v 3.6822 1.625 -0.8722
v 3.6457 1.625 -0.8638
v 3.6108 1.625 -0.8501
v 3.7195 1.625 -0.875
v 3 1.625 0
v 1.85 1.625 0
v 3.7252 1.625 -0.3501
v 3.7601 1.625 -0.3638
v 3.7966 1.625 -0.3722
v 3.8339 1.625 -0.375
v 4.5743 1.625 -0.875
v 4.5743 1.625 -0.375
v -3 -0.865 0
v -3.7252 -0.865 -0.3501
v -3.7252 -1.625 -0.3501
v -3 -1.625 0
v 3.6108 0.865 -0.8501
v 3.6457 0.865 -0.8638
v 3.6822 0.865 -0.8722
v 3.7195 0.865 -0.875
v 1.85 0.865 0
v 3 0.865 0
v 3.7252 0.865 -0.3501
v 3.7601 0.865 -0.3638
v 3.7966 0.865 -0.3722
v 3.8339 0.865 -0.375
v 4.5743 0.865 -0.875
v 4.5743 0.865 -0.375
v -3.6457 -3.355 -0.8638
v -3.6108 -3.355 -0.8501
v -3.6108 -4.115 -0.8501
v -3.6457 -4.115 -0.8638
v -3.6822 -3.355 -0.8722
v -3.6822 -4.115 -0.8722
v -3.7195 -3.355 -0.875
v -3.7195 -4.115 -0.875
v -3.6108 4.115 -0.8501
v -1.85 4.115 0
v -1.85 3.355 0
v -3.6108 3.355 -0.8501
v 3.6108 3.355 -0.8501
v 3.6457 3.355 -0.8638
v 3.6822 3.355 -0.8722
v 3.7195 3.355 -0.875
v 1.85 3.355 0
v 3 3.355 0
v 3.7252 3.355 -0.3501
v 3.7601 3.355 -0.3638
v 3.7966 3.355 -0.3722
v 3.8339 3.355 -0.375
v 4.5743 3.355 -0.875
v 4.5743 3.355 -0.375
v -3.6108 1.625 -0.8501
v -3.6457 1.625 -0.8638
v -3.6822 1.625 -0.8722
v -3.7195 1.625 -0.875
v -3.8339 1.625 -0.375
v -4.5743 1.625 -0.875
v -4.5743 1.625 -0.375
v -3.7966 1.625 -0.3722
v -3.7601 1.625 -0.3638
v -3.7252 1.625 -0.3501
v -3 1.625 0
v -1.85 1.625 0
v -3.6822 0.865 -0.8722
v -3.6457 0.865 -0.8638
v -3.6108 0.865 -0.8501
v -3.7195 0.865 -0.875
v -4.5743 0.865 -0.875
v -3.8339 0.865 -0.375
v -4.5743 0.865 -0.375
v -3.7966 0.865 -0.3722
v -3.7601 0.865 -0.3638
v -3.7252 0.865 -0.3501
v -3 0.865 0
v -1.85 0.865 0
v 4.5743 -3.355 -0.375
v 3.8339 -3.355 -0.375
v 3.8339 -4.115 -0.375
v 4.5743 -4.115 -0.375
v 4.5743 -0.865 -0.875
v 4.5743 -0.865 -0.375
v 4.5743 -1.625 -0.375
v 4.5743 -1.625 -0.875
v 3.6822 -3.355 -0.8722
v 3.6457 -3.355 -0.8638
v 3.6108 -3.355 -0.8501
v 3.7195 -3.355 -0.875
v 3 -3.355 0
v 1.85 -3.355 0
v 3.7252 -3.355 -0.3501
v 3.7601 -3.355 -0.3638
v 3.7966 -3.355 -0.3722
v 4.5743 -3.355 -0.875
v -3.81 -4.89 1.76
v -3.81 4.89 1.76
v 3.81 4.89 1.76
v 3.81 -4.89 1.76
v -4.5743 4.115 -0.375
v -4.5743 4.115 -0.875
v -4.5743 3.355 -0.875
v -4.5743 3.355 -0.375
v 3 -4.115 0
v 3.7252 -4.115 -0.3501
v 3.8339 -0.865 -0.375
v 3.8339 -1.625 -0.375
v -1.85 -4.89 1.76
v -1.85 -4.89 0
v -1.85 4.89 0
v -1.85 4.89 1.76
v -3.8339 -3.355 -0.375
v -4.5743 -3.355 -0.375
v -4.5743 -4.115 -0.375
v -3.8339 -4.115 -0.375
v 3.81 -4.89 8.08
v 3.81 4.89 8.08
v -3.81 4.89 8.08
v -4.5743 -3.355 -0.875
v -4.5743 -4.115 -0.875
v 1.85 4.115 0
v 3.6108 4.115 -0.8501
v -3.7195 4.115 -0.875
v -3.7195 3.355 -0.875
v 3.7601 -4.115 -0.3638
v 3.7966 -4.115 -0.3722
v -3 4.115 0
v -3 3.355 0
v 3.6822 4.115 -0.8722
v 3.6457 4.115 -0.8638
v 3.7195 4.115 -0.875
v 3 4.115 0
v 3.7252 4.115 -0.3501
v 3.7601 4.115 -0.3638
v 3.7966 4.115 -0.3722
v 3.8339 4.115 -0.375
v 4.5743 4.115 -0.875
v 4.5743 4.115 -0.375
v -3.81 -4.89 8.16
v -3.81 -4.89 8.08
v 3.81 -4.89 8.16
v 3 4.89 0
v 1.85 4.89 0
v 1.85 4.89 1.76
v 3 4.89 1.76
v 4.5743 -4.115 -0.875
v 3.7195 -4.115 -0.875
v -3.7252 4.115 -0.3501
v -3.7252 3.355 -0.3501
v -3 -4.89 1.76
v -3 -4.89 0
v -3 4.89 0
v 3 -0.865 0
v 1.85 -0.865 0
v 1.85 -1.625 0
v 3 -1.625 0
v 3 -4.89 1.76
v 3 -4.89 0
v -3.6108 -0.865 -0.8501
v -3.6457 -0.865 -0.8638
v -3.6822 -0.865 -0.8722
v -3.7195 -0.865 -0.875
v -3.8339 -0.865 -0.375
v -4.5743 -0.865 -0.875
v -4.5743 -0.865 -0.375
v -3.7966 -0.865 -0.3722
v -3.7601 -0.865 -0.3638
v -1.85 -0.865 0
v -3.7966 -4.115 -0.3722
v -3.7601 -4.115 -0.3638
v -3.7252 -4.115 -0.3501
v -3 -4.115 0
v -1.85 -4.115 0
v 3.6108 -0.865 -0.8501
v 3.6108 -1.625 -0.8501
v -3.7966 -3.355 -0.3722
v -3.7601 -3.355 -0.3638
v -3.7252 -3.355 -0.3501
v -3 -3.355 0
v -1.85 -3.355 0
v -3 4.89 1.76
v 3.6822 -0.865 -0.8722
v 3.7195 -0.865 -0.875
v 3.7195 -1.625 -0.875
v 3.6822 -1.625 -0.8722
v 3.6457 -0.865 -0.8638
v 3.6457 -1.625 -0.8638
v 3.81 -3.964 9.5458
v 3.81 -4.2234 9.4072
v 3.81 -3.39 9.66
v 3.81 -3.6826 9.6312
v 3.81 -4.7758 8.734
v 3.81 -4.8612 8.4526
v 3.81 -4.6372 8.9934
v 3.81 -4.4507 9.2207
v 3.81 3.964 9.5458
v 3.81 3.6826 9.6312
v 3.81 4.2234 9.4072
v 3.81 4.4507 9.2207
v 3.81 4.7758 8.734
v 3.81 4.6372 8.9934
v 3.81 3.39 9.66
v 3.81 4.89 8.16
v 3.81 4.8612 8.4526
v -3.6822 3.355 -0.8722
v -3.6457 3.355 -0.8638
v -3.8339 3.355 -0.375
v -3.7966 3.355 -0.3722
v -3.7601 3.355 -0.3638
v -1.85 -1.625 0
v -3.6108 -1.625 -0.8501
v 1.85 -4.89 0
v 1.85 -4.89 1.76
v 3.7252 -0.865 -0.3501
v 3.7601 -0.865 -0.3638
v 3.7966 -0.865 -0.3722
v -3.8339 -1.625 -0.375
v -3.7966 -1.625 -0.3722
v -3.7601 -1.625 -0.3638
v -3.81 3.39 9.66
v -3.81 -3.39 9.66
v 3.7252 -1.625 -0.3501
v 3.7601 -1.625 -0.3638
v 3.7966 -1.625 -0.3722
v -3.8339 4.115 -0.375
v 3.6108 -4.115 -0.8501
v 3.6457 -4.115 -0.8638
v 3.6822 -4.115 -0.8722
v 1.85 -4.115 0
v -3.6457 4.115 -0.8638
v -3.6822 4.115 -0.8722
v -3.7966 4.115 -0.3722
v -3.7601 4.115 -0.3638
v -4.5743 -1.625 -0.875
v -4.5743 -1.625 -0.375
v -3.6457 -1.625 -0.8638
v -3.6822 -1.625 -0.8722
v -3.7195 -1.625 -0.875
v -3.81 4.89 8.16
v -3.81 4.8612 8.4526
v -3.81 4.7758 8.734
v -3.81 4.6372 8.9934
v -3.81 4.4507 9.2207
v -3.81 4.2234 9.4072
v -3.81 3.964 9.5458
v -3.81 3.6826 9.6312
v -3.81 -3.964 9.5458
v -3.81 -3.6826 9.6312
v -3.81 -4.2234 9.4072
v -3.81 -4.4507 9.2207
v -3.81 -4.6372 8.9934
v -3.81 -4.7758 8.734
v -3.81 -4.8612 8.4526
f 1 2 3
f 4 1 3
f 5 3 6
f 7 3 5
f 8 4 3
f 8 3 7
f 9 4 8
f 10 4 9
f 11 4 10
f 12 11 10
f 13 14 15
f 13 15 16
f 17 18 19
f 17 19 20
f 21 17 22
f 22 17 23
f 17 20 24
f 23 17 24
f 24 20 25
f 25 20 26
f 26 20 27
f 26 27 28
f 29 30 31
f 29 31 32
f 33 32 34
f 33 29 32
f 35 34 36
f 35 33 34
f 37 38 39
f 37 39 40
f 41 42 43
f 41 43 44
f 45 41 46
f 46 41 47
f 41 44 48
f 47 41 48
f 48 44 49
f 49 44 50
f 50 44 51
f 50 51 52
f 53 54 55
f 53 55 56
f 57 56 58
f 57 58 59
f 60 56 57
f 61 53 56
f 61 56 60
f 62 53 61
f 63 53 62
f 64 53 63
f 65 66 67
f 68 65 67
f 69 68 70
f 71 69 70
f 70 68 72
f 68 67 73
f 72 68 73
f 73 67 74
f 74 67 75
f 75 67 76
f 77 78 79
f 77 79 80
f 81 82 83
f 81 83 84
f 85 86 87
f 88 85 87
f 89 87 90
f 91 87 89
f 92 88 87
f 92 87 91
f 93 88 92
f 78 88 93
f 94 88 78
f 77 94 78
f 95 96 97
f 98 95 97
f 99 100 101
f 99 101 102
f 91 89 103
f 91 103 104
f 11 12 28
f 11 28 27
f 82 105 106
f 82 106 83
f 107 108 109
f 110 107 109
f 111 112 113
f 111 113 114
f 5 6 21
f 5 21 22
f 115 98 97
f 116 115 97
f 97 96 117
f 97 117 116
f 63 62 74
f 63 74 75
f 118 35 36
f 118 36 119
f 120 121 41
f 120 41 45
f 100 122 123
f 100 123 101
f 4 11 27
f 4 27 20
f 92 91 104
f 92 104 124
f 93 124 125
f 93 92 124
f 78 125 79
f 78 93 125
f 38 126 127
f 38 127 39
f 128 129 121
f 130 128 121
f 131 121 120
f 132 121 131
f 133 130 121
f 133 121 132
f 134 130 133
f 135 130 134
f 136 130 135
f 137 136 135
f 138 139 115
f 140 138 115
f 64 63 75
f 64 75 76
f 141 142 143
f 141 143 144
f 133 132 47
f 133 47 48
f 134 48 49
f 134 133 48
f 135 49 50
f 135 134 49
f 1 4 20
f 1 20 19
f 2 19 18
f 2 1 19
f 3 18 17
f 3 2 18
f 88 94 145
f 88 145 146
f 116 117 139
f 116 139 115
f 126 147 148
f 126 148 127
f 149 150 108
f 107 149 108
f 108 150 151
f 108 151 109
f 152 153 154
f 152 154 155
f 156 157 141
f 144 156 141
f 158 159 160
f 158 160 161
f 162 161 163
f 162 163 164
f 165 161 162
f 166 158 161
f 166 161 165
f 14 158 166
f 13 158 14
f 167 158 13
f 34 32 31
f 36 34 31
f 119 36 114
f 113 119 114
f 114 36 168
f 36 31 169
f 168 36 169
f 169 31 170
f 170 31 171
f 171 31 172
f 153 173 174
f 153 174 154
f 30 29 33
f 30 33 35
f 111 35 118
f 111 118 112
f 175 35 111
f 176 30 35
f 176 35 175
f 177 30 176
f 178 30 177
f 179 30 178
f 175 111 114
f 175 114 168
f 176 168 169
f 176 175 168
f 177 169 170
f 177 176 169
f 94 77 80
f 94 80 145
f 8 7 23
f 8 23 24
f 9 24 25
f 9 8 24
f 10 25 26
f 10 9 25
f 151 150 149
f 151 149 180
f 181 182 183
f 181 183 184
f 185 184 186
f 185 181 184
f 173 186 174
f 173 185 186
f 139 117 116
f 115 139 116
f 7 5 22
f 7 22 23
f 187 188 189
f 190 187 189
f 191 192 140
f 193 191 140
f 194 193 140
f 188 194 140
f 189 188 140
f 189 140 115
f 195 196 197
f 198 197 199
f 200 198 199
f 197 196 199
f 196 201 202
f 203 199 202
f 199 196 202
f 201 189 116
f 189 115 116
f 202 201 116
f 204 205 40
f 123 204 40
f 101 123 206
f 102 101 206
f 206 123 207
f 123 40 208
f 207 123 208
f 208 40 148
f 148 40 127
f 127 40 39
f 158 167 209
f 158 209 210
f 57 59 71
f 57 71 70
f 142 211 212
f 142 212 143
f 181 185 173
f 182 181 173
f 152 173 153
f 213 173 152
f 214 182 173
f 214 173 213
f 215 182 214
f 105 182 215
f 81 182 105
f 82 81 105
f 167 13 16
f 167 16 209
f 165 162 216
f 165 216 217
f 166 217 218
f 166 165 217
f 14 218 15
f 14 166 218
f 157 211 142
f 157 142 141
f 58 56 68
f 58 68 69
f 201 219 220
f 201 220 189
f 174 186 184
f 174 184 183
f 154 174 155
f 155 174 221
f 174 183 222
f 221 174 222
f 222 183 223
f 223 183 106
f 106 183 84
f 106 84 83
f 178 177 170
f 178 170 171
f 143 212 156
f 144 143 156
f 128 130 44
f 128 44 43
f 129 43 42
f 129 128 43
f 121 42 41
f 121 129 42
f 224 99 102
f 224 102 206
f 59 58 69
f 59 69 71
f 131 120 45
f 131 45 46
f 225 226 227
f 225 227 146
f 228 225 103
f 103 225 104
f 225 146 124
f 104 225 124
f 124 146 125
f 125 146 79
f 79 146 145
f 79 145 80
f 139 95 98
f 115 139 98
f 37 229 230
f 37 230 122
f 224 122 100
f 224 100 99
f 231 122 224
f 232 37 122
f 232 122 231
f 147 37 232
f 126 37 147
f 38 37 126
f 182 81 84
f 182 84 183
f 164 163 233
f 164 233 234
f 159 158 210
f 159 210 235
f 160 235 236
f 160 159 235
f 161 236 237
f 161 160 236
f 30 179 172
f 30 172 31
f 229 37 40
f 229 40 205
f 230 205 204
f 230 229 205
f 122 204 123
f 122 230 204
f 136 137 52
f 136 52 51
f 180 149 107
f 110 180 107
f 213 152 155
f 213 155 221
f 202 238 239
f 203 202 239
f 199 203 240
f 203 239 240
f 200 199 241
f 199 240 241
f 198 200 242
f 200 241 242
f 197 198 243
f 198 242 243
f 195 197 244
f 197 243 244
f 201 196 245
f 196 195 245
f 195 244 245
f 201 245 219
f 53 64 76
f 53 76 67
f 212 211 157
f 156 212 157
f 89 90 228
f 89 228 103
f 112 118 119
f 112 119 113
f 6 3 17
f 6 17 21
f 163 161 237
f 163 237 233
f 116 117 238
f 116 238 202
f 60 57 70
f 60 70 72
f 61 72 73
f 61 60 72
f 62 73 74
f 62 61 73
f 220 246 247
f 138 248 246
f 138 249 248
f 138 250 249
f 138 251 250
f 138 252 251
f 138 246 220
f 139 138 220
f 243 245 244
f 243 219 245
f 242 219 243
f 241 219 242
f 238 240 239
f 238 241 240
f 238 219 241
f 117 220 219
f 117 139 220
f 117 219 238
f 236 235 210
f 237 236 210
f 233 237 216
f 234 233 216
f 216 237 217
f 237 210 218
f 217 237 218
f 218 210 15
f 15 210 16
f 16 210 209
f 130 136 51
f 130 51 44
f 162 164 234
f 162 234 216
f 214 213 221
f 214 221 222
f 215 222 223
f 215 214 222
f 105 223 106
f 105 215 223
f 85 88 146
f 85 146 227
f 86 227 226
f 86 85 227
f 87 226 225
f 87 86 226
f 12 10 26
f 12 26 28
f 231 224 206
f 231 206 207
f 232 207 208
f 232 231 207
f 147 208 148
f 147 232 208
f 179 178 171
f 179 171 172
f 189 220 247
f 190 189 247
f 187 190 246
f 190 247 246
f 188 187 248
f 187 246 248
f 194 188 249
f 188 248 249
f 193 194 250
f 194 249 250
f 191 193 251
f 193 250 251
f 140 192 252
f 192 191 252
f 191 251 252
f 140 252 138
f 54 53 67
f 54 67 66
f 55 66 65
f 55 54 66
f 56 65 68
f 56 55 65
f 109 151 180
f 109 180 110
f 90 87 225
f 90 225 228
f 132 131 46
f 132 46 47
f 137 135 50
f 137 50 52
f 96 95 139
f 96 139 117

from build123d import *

# Parameters (mm, degrees)
F0_W      = 1.15
F0_H      = 9.78
F1_DEPTH  = 1.76
F2_W      = 7.62
F2_H      = 9.78
F3_DEPTH  = 6.32
F4_W      = 7.62
F4_H      = 9.78
F5_DEPTH  = 1.58
F7_DEPTH  = 25
F9_DEPTH  = 9.78
F10_W     = 0.775
F10_H     = 0.875
F10_W_2   = 1.73
F10_W_3   = 0.865
F11_DEPTH = 100


with BuildPart() as f1:
    # F0 (on Top) → F1 (new body)
    with BuildSketch(Plane.XY):
        with Locations((-2.425, 0)):
            Rectangle(F0_W, F0_H)
        with Locations((2.425, 0)):
            Rectangle(F0_W, F0_H)
    extrude(amount=F1_DEPTH)


with BuildPart() as f3:
    # F2 (on face) → F3 (new body)
    with BuildSketch(Plane.XY.offset(1.76)):
        Rectangle(F2_W, F2_H)
    extrude(amount=F3_DEPTH)


with BuildPart() as f5:
    # F4 (on face) → F5 (new body)
    with BuildSketch(Plane.XY.offset(8.08)):
        Rectangle(F4_W, F4_H)
    extrude(amount=F5_DEPTH)

    # F6 (on face) → F7 (cut)
    with BuildSketch(Plane(origin=(-3.81, 0, 0), x_dir=(0, -1, 0), z_dir=(-1, 0, 0))):
        with BuildLine():
            ThreePointArc((-4.89, 8.16), (-4.45066, 9.22066), (-3.39, 9.66))
            Line((-3.39, 9.66), (-4.89, 9.66))
            Line((-4.89, 9.66), (-4.89, 8.16))
        make_face()
        with BuildLine():
            ThreePointArc((3.39, 9.66), (4.45066, 9.22066), (4.89, 8.16))
            Line((4.89, 8.16), (4.89, 9.66))
            Line((4.89, 9.66), (3.39, 9.66))
        make_face()
    extrude(amount=-F7_DEPTH, mode=Mode.SUBTRACT)


with BuildPart() as f9:
    # F8 (on face) → F9 (new body)
    with BuildSketch(Plane(origin=(0, 4.89, 0), x_dir=(-1, 0, 0), z_dir=(0, 1, 0))):
        with BuildLine():
            Line((-3.833904, -0.375), (-4.574276, -0.375))
            Line((-4.574276, -0.375), (-4.574276, -0.875))
            Line((-4.574276, -0.875), (-3.71952, -0.875))
            ThreePointArc((-3.71952, -0.875), (-3.663768, -0.868704), (-3.610824, -0.850134))
            Line((-3.610824, -0.850134), (-1.85, 0))
            Line((-1.85, 0), (-3, 0))
            Line((-3, 0), (-3.725208, -0.350134))
            ThreePointArc((-3.725208, -0.350134), (-3.778152, -0.368704), (-3.833904, -0.375))
        make_face()
        with BuildLine():
            Line((4.574276, -0.375), (3.833904, -0.375))
            ThreePointArc((3.833904, -0.375), (3.778152, -0.368704), (3.725208, -0.350134))
            Line((3.725208, -0.350134), (3, 0))
            Line((3, 0), (1.85, 0))
            Line((1.85, 0), (3.610824, -0.850134))
            ThreePointArc((3.610824, -0.850134), (3.663768, -0.868704), (3.71952, -0.875))
            Line((3.71952, -0.875), (4.574276, -0.875))
            Line((4.574276, -0.875), (4.574276, -0.375))
        make_face()
    extrude(amount=-F9_DEPTH)

    # F10 (on face) → F11 (cut)
    with BuildSketch(Plane.YZ.offset(4.574276)):
        with Locations((-4.5025, -0.4375)):
            Rectangle(F10_W, F10_H)
        with Locations((-2.49, -0.4375)):
            Rectangle(F10_W_2, F10_H)
        with Locations((-0.4325, -0.4375)):
            Rectangle(F10_W_3, F10_H)
        with Locations((0.4325, -0.4375)):
            Rectangle(F10_W_3, F10_H)
        with Locations((4.5025, -0.4375)):
            Rectangle(F10_W, F10_H)
        with Locations((2.49, -0.4375)):
            Rectangle(F10_W_2, F10_H)
    extrude(amount=-F11_DEPTH, mode=Mode.SUBTRACT)


solid = Compound([f1.part, f3.part, f5.part, f9.part])
